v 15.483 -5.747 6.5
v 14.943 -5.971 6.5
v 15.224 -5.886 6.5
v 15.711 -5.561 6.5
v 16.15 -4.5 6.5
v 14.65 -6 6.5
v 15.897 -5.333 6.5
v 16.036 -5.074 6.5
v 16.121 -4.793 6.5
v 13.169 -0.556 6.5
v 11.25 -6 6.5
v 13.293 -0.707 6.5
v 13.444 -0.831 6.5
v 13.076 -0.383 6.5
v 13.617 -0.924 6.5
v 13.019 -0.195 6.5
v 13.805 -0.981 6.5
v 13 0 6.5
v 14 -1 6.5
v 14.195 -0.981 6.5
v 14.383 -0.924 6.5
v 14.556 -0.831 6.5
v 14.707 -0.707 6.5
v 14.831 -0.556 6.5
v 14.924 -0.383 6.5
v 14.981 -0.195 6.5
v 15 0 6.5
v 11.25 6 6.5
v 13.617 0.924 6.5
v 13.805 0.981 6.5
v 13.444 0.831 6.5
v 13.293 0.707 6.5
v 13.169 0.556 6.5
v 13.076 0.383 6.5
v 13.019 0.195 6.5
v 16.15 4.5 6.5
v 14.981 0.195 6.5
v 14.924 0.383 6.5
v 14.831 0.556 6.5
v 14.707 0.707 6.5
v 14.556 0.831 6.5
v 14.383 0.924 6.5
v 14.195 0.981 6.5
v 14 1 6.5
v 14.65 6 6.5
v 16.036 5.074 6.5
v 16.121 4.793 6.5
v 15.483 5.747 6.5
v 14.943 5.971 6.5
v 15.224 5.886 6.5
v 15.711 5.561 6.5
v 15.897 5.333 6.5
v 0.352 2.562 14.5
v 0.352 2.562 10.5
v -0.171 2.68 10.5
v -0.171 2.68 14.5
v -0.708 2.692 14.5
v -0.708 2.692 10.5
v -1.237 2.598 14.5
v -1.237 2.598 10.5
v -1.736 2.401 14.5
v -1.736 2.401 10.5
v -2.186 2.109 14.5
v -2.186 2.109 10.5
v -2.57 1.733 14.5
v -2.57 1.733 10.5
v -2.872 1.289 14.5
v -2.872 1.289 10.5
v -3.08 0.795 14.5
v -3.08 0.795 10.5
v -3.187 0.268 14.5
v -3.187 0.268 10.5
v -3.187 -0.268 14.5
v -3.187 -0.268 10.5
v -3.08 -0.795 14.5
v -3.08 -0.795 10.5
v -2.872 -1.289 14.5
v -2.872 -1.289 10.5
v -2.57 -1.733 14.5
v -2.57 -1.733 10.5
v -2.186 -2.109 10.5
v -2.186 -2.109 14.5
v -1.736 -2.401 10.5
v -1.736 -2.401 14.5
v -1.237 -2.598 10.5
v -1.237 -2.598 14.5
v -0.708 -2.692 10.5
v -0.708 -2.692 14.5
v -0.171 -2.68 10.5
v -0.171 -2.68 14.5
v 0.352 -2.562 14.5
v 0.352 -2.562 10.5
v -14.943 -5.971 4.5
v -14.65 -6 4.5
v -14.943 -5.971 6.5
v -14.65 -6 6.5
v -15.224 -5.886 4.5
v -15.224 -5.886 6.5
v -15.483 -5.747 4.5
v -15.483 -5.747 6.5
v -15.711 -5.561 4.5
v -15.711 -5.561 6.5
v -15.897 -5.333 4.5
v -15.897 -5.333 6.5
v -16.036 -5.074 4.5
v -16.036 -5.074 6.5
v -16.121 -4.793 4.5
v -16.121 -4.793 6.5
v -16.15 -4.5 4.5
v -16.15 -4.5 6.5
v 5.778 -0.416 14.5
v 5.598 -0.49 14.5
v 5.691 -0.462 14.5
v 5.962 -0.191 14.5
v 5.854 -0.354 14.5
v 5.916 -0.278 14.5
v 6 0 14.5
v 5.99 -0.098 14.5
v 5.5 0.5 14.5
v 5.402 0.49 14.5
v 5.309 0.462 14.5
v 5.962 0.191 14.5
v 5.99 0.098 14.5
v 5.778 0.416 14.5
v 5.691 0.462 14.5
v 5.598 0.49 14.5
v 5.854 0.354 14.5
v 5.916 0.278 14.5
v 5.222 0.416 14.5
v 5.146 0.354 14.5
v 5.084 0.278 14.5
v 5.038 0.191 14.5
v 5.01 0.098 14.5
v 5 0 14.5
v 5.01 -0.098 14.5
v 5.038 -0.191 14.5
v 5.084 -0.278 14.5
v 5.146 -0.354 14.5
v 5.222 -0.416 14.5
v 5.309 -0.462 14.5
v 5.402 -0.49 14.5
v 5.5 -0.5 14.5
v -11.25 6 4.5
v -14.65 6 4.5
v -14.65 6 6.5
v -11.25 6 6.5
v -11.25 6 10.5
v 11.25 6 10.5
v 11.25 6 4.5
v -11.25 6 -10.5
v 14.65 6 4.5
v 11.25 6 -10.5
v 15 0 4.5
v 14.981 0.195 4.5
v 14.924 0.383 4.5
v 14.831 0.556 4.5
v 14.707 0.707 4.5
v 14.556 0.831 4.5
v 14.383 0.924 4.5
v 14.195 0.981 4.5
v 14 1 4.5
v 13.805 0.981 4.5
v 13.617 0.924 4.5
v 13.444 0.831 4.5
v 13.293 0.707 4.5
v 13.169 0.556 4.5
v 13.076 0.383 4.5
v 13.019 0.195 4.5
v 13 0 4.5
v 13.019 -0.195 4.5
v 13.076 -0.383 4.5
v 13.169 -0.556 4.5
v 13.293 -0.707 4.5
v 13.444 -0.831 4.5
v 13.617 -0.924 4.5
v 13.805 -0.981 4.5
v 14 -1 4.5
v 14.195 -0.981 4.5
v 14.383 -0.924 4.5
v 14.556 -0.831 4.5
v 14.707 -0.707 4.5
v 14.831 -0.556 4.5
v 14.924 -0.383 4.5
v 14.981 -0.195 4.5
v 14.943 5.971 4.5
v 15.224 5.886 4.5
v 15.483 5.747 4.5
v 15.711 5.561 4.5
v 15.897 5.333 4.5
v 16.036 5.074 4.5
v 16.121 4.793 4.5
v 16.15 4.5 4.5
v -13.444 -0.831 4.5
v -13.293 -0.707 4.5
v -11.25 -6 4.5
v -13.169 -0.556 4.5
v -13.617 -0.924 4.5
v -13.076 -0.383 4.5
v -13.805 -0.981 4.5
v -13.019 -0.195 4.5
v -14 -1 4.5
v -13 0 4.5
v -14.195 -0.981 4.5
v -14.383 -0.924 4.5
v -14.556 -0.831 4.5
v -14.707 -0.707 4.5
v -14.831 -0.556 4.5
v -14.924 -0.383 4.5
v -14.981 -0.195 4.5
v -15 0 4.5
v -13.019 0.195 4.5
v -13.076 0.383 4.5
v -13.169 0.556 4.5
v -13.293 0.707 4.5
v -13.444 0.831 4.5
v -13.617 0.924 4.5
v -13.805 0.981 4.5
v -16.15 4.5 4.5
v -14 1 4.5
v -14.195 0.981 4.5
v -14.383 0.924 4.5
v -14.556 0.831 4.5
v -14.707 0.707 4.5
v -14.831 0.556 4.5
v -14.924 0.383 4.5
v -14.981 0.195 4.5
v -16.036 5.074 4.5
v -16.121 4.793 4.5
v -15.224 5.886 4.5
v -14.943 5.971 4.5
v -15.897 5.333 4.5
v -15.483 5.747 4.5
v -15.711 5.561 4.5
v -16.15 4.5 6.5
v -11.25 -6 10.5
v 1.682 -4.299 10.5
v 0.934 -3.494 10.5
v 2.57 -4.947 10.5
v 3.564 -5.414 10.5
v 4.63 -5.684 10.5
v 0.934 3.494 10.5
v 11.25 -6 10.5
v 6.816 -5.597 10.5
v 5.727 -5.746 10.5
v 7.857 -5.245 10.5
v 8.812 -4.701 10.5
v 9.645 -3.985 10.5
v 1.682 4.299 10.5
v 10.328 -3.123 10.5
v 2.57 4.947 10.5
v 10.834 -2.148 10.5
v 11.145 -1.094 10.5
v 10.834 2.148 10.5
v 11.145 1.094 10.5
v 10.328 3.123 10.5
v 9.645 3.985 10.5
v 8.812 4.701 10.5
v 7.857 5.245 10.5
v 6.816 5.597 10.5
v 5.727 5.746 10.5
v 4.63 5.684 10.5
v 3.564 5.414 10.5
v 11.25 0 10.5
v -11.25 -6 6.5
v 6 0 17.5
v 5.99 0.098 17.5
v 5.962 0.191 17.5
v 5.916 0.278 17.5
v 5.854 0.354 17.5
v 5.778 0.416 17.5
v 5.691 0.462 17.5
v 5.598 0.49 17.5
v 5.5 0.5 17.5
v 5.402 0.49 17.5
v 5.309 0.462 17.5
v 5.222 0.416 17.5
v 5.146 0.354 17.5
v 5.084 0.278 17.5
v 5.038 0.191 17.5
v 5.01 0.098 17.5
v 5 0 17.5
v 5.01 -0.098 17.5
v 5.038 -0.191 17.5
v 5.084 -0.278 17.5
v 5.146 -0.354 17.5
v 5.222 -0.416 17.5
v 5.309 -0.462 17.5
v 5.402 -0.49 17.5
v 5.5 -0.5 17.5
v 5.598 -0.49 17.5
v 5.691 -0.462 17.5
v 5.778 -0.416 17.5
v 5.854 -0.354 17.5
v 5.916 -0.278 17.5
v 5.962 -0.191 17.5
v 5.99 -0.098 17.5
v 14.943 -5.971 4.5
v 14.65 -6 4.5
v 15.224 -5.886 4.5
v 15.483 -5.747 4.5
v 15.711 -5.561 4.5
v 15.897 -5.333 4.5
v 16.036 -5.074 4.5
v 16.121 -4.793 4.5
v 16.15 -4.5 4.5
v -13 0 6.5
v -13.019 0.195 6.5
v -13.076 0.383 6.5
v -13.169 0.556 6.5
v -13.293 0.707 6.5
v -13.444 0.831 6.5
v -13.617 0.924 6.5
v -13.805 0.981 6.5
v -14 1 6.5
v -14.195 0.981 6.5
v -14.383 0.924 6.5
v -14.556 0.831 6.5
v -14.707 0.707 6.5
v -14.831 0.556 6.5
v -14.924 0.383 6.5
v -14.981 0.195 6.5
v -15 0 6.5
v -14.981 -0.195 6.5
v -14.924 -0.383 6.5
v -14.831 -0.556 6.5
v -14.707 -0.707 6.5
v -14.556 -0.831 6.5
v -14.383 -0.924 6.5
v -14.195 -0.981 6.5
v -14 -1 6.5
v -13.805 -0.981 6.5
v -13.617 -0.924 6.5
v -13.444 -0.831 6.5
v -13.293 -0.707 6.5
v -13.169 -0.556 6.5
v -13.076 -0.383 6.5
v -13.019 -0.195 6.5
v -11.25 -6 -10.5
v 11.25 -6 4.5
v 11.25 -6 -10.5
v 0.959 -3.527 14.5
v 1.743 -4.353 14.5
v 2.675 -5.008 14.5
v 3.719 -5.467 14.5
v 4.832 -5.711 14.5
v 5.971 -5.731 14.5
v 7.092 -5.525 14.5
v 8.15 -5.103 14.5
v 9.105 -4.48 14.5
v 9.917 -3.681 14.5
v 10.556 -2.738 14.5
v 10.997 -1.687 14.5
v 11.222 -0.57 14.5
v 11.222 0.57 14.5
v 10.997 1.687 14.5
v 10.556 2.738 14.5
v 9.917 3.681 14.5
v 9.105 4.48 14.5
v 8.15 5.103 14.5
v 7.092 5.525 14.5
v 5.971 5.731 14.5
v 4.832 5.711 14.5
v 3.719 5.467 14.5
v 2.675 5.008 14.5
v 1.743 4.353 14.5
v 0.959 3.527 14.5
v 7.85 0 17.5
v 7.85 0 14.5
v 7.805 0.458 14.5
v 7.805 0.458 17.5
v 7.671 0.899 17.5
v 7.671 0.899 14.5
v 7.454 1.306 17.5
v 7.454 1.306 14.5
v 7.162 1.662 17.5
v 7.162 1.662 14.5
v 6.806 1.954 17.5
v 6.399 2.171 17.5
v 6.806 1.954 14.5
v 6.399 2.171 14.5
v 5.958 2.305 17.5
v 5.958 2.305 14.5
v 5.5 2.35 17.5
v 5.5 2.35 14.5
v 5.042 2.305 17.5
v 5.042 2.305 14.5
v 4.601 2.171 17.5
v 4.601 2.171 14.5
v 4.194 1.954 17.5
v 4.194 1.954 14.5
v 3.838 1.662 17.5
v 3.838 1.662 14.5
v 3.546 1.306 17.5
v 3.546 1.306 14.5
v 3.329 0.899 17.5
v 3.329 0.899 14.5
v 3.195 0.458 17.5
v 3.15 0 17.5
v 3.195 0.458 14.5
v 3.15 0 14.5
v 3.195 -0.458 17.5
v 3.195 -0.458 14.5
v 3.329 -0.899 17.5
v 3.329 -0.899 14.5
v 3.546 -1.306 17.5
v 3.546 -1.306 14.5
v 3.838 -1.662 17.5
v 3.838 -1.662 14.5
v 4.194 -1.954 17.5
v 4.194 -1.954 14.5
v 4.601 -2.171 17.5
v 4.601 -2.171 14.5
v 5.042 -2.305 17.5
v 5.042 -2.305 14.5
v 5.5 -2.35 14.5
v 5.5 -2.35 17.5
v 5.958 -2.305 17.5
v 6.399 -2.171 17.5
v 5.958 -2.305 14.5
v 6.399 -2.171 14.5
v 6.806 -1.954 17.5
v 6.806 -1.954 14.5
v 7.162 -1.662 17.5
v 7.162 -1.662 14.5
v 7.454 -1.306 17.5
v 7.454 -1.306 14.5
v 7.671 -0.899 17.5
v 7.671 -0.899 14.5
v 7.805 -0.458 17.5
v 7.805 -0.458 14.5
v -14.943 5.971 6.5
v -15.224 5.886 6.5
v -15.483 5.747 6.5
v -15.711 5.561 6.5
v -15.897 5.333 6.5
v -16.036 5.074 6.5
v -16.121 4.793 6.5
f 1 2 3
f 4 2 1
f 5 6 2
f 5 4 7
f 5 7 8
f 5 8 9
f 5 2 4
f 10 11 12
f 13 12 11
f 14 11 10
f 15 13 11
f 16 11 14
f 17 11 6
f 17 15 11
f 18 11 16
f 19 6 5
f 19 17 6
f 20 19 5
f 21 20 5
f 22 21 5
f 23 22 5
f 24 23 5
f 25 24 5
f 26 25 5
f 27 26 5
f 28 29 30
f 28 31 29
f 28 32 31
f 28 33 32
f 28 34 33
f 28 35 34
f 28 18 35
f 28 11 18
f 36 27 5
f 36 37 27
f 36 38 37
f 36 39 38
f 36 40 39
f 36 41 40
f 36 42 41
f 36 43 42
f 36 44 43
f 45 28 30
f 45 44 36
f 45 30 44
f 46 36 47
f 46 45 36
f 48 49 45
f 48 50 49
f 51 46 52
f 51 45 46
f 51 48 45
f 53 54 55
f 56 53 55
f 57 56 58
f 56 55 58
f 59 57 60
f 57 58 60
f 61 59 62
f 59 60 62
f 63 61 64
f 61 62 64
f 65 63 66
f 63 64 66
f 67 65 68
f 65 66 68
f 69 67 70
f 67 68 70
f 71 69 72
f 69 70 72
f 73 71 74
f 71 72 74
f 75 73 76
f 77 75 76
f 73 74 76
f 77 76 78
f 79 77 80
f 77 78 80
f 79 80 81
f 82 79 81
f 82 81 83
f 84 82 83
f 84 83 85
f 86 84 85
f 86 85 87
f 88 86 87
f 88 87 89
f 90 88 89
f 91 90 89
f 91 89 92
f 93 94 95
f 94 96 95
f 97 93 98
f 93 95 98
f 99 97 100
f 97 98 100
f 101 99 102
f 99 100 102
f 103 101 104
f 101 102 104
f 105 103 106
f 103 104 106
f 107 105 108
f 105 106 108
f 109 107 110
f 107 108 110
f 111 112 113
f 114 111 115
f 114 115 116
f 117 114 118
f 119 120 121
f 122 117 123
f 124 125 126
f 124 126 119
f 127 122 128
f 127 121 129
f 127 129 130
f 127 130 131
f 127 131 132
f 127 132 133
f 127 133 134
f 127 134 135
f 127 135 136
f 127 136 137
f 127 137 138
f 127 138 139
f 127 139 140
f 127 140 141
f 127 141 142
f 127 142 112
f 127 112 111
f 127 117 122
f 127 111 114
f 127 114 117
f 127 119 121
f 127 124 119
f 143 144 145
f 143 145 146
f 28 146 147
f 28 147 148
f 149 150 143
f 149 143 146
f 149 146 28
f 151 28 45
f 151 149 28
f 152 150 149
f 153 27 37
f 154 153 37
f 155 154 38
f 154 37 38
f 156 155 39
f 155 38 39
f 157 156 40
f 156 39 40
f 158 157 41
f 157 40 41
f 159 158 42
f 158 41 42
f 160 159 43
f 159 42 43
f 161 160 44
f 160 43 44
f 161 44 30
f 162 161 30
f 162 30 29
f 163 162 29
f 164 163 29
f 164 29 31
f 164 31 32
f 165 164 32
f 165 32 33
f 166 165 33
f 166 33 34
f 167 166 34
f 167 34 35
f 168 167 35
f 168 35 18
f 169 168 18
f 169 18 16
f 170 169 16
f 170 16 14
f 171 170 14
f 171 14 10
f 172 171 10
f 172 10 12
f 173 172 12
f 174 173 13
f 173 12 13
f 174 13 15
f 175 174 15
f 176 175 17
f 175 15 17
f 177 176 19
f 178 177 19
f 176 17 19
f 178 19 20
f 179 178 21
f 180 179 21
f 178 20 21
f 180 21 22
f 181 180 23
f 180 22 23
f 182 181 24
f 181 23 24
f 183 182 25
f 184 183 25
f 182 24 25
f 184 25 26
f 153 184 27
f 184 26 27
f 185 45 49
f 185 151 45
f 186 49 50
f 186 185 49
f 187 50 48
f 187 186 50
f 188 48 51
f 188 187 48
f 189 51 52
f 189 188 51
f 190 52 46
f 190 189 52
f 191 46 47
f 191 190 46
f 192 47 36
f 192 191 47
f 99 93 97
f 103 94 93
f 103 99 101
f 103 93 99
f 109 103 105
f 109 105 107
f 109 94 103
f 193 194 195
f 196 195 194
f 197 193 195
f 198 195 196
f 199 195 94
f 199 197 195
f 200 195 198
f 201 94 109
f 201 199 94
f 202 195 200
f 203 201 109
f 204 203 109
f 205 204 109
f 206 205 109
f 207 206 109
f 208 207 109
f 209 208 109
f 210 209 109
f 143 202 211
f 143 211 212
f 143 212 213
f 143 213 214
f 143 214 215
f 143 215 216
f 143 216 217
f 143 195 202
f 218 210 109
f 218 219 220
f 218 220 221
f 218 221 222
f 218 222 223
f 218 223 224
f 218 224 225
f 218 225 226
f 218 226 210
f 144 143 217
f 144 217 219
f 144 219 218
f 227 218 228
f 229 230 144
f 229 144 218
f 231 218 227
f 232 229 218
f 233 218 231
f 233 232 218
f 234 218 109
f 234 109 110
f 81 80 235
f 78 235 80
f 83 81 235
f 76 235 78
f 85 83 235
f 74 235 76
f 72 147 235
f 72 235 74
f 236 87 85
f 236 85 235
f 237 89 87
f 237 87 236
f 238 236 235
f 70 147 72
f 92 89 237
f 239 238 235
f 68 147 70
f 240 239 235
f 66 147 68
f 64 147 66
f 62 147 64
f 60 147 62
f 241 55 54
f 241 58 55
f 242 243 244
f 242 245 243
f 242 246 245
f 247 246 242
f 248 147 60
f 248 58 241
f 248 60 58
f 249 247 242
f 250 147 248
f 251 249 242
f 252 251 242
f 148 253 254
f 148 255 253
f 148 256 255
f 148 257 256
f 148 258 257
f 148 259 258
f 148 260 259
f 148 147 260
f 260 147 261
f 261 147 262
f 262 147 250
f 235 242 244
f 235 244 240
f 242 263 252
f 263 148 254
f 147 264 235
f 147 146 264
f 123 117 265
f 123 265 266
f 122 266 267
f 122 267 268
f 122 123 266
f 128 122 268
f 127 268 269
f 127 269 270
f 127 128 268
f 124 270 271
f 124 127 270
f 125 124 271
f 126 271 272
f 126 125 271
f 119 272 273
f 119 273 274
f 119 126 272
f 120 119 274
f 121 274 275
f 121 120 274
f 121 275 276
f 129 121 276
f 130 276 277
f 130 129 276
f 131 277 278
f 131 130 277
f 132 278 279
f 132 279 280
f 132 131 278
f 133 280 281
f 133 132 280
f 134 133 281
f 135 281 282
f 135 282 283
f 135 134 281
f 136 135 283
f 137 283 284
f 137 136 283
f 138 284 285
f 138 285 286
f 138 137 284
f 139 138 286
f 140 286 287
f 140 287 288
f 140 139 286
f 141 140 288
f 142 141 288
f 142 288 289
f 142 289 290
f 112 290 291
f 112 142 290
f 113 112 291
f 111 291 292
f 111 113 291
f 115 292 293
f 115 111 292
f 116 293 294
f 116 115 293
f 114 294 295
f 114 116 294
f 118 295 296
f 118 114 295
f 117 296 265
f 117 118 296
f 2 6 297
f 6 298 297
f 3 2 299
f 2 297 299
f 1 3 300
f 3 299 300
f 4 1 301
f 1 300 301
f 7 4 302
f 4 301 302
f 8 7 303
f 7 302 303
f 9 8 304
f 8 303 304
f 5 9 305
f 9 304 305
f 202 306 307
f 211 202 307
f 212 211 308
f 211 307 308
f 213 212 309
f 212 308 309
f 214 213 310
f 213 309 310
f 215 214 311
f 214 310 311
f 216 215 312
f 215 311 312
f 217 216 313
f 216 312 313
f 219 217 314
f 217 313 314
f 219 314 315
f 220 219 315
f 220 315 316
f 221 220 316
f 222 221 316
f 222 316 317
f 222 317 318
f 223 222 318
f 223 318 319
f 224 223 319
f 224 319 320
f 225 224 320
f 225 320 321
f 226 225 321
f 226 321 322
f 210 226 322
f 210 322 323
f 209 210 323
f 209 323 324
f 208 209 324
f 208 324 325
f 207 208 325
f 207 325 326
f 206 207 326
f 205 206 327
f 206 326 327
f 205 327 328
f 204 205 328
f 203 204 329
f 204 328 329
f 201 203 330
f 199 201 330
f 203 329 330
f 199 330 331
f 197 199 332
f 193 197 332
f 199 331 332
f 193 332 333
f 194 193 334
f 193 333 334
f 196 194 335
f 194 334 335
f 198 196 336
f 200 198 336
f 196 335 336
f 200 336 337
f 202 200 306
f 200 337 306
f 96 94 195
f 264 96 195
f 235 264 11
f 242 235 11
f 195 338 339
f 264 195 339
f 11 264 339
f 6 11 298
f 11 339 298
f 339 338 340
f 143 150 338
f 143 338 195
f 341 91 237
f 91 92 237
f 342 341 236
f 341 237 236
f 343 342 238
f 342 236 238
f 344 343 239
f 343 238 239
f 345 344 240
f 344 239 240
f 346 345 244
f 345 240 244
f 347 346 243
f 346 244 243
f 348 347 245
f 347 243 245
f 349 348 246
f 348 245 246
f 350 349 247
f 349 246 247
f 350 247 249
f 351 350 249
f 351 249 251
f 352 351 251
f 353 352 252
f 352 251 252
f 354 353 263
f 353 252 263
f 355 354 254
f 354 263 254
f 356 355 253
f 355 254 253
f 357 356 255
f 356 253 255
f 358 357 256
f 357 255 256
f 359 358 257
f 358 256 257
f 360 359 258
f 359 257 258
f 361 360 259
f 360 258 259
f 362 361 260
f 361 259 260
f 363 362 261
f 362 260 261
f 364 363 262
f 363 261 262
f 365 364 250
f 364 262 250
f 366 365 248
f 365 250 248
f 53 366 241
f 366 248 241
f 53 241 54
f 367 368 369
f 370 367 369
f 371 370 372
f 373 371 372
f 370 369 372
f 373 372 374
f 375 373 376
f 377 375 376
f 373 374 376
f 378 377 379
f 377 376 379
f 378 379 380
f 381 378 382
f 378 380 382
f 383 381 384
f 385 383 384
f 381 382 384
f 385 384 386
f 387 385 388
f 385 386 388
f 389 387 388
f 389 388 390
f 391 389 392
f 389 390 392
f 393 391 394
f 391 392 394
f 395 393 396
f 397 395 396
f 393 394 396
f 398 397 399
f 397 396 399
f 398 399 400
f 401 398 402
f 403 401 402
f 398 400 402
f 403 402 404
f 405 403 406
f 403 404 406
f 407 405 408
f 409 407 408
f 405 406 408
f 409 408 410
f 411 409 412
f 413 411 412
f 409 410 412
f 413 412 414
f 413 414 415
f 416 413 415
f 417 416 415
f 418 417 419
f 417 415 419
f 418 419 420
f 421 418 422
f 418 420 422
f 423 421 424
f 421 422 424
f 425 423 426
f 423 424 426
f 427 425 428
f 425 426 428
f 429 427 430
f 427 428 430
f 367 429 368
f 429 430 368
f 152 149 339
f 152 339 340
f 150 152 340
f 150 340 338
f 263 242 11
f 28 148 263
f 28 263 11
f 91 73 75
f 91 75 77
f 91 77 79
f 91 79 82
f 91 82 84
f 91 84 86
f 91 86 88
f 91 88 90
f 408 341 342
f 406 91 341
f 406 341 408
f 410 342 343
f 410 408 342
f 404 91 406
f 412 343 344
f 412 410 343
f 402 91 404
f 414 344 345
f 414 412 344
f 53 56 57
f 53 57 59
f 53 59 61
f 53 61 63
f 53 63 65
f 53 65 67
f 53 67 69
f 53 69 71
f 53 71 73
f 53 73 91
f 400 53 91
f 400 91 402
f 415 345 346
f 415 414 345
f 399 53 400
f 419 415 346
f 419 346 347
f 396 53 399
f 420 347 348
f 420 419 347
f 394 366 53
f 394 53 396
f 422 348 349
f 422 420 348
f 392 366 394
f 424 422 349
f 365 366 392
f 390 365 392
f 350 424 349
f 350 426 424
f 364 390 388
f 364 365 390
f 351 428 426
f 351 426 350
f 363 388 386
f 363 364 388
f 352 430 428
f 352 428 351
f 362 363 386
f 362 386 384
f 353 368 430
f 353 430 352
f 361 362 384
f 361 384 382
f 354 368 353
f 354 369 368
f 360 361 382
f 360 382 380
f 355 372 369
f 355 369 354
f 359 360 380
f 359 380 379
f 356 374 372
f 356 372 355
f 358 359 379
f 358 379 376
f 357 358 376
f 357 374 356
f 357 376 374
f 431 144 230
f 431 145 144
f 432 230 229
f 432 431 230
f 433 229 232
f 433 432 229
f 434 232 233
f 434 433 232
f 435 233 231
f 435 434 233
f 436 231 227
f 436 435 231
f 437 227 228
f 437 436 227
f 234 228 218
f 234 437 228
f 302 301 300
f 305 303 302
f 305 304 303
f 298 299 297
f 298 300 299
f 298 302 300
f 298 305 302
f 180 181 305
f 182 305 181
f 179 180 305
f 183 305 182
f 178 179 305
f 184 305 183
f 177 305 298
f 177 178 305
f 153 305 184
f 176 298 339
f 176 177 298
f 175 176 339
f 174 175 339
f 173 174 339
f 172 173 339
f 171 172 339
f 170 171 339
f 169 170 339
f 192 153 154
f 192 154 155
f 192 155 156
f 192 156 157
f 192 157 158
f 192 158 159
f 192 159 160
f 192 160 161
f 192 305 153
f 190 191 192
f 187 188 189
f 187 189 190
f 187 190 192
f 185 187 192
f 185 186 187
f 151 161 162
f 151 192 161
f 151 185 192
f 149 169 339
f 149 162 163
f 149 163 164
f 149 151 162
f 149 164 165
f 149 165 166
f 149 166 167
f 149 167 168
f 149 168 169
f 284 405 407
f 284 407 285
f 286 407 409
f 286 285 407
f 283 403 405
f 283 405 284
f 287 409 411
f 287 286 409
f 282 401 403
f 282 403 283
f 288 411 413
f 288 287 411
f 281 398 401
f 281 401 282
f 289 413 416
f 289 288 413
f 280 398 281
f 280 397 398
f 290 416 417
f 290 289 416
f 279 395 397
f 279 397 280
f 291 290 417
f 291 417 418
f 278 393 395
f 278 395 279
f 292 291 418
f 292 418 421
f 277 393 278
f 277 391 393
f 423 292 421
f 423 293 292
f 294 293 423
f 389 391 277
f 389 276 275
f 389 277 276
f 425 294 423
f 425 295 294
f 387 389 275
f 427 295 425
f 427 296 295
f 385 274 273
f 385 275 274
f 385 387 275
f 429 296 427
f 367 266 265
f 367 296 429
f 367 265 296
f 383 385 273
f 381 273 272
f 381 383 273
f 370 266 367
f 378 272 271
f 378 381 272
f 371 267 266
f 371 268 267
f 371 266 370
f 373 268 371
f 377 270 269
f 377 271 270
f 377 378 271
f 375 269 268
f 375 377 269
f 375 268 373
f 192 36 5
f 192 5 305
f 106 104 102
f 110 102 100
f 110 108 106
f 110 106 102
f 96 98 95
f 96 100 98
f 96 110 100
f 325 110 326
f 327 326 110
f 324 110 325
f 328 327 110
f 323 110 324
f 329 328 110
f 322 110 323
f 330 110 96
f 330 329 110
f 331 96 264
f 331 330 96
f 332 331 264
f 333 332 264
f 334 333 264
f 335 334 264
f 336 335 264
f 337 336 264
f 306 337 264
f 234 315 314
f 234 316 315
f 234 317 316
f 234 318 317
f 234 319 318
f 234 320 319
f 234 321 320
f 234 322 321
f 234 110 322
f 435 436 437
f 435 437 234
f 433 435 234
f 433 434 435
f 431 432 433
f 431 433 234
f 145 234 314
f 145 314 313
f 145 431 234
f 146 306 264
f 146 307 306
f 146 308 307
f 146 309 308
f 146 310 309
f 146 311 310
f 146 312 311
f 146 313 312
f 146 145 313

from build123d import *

# Parameters (mm, degrees)
RESSALTO_EXTRUS_O4_DEPTH = 6
ESBO_O8_R                = 5.75
RESSALTO_EXTRUS_O7_DEPTH = 4
ESBO_O9_R                = 2.35
ESBO_O9_R_2              = 0.5
RESSALTO_EXTRUS_O8_DEPTH = 3
ESBO_O10_R               = 2.7
RESSALTO_EXTRUS_O9_DEPTH = 4
ESBO_O12_R               = 1
CORTE_EXTRUS_O1_DEPTH    = 25.203770367
FILETE1_R                = 1.5


with BuildPart() as part:
    # Esboço4 → Ressalto-extrusão4 (new, symmetric)
    with BuildSketch(Plane(origin=(0, 0, 0), x_dir=(1, 0, 0), z_dir=(0, 1, 0))):
        Polygon((-11.25, -10.5), (11.25, -10.5), (11.25, -6.5), (16.15, -6.5), (16.15, -4.5), (11.25, -4.5), (11.25, 10.5), (-11.25, 10.5), (-11.25, -4.5), (-16.15, -4.5), (-16.15, -6.5), (-11.25, -6.5), align=None)
    extrude(amount=RESSALTO_EXTRUS_O4_DEPTH, both=True)

    # Esboço8 → Ressalto-extrusão7 (add)
    with BuildSketch(Plane.XY.offset(10.5)):
        with Locations((5.5, 0)):
            Circle(ESBO_O8_R)
    extrude(amount=RESSALTO_EXTRUS_O7_DEPTH)

    # Esboço9 → Ressalto-extrusão8 (add)
    with BuildSketch(Plane.XY.offset(14.5)):
        with Locations((5.5, 0)):
            Circle(ESBO_O9_R)
        with Locations((5.5, 0)):
            Circle(ESBO_O9_R_2, mode=Mode.SUBTRACT)
    extrude(amount=RESSALTO_EXTRUS_O8_DEPTH)

    # Esboço10 → Ressalto-extrusão9 (add)
    with BuildSketch(Plane.XY.offset(10.5)):
        with Locations((-0.5, 0)):
            Circle(ESBO_O10_R)
    extrude(amount=RESSALTO_EXTRUS_O9_DEPTH)

    # Esboço12 → Corte-extrusão1 (cut, through all)
    with BuildSketch(Plane.XY.offset(6.5)):
        with Locations((-14, 0)):
            Circle(ESBO_O12_R)
        with Locations((14, 0)):
            Circle(ESBO_O12_R)
    extrude(amount=-CORTE_EXTRUS_O1_DEPTH, mode=Mode.SUBTRACT)

    # Filete1
    filete1_edges = [part.edges().sort_by_distance(p)[0] for p in [
        (16.15, -6, 5.5),
        (-16.15, -6, 5.5),
        (-16.15, 6, 5.5),
        (16.15, 6, 5.5),
    ]]
    fillet(filete1_edges, radius=FILETE1_R)


solid = part.part
